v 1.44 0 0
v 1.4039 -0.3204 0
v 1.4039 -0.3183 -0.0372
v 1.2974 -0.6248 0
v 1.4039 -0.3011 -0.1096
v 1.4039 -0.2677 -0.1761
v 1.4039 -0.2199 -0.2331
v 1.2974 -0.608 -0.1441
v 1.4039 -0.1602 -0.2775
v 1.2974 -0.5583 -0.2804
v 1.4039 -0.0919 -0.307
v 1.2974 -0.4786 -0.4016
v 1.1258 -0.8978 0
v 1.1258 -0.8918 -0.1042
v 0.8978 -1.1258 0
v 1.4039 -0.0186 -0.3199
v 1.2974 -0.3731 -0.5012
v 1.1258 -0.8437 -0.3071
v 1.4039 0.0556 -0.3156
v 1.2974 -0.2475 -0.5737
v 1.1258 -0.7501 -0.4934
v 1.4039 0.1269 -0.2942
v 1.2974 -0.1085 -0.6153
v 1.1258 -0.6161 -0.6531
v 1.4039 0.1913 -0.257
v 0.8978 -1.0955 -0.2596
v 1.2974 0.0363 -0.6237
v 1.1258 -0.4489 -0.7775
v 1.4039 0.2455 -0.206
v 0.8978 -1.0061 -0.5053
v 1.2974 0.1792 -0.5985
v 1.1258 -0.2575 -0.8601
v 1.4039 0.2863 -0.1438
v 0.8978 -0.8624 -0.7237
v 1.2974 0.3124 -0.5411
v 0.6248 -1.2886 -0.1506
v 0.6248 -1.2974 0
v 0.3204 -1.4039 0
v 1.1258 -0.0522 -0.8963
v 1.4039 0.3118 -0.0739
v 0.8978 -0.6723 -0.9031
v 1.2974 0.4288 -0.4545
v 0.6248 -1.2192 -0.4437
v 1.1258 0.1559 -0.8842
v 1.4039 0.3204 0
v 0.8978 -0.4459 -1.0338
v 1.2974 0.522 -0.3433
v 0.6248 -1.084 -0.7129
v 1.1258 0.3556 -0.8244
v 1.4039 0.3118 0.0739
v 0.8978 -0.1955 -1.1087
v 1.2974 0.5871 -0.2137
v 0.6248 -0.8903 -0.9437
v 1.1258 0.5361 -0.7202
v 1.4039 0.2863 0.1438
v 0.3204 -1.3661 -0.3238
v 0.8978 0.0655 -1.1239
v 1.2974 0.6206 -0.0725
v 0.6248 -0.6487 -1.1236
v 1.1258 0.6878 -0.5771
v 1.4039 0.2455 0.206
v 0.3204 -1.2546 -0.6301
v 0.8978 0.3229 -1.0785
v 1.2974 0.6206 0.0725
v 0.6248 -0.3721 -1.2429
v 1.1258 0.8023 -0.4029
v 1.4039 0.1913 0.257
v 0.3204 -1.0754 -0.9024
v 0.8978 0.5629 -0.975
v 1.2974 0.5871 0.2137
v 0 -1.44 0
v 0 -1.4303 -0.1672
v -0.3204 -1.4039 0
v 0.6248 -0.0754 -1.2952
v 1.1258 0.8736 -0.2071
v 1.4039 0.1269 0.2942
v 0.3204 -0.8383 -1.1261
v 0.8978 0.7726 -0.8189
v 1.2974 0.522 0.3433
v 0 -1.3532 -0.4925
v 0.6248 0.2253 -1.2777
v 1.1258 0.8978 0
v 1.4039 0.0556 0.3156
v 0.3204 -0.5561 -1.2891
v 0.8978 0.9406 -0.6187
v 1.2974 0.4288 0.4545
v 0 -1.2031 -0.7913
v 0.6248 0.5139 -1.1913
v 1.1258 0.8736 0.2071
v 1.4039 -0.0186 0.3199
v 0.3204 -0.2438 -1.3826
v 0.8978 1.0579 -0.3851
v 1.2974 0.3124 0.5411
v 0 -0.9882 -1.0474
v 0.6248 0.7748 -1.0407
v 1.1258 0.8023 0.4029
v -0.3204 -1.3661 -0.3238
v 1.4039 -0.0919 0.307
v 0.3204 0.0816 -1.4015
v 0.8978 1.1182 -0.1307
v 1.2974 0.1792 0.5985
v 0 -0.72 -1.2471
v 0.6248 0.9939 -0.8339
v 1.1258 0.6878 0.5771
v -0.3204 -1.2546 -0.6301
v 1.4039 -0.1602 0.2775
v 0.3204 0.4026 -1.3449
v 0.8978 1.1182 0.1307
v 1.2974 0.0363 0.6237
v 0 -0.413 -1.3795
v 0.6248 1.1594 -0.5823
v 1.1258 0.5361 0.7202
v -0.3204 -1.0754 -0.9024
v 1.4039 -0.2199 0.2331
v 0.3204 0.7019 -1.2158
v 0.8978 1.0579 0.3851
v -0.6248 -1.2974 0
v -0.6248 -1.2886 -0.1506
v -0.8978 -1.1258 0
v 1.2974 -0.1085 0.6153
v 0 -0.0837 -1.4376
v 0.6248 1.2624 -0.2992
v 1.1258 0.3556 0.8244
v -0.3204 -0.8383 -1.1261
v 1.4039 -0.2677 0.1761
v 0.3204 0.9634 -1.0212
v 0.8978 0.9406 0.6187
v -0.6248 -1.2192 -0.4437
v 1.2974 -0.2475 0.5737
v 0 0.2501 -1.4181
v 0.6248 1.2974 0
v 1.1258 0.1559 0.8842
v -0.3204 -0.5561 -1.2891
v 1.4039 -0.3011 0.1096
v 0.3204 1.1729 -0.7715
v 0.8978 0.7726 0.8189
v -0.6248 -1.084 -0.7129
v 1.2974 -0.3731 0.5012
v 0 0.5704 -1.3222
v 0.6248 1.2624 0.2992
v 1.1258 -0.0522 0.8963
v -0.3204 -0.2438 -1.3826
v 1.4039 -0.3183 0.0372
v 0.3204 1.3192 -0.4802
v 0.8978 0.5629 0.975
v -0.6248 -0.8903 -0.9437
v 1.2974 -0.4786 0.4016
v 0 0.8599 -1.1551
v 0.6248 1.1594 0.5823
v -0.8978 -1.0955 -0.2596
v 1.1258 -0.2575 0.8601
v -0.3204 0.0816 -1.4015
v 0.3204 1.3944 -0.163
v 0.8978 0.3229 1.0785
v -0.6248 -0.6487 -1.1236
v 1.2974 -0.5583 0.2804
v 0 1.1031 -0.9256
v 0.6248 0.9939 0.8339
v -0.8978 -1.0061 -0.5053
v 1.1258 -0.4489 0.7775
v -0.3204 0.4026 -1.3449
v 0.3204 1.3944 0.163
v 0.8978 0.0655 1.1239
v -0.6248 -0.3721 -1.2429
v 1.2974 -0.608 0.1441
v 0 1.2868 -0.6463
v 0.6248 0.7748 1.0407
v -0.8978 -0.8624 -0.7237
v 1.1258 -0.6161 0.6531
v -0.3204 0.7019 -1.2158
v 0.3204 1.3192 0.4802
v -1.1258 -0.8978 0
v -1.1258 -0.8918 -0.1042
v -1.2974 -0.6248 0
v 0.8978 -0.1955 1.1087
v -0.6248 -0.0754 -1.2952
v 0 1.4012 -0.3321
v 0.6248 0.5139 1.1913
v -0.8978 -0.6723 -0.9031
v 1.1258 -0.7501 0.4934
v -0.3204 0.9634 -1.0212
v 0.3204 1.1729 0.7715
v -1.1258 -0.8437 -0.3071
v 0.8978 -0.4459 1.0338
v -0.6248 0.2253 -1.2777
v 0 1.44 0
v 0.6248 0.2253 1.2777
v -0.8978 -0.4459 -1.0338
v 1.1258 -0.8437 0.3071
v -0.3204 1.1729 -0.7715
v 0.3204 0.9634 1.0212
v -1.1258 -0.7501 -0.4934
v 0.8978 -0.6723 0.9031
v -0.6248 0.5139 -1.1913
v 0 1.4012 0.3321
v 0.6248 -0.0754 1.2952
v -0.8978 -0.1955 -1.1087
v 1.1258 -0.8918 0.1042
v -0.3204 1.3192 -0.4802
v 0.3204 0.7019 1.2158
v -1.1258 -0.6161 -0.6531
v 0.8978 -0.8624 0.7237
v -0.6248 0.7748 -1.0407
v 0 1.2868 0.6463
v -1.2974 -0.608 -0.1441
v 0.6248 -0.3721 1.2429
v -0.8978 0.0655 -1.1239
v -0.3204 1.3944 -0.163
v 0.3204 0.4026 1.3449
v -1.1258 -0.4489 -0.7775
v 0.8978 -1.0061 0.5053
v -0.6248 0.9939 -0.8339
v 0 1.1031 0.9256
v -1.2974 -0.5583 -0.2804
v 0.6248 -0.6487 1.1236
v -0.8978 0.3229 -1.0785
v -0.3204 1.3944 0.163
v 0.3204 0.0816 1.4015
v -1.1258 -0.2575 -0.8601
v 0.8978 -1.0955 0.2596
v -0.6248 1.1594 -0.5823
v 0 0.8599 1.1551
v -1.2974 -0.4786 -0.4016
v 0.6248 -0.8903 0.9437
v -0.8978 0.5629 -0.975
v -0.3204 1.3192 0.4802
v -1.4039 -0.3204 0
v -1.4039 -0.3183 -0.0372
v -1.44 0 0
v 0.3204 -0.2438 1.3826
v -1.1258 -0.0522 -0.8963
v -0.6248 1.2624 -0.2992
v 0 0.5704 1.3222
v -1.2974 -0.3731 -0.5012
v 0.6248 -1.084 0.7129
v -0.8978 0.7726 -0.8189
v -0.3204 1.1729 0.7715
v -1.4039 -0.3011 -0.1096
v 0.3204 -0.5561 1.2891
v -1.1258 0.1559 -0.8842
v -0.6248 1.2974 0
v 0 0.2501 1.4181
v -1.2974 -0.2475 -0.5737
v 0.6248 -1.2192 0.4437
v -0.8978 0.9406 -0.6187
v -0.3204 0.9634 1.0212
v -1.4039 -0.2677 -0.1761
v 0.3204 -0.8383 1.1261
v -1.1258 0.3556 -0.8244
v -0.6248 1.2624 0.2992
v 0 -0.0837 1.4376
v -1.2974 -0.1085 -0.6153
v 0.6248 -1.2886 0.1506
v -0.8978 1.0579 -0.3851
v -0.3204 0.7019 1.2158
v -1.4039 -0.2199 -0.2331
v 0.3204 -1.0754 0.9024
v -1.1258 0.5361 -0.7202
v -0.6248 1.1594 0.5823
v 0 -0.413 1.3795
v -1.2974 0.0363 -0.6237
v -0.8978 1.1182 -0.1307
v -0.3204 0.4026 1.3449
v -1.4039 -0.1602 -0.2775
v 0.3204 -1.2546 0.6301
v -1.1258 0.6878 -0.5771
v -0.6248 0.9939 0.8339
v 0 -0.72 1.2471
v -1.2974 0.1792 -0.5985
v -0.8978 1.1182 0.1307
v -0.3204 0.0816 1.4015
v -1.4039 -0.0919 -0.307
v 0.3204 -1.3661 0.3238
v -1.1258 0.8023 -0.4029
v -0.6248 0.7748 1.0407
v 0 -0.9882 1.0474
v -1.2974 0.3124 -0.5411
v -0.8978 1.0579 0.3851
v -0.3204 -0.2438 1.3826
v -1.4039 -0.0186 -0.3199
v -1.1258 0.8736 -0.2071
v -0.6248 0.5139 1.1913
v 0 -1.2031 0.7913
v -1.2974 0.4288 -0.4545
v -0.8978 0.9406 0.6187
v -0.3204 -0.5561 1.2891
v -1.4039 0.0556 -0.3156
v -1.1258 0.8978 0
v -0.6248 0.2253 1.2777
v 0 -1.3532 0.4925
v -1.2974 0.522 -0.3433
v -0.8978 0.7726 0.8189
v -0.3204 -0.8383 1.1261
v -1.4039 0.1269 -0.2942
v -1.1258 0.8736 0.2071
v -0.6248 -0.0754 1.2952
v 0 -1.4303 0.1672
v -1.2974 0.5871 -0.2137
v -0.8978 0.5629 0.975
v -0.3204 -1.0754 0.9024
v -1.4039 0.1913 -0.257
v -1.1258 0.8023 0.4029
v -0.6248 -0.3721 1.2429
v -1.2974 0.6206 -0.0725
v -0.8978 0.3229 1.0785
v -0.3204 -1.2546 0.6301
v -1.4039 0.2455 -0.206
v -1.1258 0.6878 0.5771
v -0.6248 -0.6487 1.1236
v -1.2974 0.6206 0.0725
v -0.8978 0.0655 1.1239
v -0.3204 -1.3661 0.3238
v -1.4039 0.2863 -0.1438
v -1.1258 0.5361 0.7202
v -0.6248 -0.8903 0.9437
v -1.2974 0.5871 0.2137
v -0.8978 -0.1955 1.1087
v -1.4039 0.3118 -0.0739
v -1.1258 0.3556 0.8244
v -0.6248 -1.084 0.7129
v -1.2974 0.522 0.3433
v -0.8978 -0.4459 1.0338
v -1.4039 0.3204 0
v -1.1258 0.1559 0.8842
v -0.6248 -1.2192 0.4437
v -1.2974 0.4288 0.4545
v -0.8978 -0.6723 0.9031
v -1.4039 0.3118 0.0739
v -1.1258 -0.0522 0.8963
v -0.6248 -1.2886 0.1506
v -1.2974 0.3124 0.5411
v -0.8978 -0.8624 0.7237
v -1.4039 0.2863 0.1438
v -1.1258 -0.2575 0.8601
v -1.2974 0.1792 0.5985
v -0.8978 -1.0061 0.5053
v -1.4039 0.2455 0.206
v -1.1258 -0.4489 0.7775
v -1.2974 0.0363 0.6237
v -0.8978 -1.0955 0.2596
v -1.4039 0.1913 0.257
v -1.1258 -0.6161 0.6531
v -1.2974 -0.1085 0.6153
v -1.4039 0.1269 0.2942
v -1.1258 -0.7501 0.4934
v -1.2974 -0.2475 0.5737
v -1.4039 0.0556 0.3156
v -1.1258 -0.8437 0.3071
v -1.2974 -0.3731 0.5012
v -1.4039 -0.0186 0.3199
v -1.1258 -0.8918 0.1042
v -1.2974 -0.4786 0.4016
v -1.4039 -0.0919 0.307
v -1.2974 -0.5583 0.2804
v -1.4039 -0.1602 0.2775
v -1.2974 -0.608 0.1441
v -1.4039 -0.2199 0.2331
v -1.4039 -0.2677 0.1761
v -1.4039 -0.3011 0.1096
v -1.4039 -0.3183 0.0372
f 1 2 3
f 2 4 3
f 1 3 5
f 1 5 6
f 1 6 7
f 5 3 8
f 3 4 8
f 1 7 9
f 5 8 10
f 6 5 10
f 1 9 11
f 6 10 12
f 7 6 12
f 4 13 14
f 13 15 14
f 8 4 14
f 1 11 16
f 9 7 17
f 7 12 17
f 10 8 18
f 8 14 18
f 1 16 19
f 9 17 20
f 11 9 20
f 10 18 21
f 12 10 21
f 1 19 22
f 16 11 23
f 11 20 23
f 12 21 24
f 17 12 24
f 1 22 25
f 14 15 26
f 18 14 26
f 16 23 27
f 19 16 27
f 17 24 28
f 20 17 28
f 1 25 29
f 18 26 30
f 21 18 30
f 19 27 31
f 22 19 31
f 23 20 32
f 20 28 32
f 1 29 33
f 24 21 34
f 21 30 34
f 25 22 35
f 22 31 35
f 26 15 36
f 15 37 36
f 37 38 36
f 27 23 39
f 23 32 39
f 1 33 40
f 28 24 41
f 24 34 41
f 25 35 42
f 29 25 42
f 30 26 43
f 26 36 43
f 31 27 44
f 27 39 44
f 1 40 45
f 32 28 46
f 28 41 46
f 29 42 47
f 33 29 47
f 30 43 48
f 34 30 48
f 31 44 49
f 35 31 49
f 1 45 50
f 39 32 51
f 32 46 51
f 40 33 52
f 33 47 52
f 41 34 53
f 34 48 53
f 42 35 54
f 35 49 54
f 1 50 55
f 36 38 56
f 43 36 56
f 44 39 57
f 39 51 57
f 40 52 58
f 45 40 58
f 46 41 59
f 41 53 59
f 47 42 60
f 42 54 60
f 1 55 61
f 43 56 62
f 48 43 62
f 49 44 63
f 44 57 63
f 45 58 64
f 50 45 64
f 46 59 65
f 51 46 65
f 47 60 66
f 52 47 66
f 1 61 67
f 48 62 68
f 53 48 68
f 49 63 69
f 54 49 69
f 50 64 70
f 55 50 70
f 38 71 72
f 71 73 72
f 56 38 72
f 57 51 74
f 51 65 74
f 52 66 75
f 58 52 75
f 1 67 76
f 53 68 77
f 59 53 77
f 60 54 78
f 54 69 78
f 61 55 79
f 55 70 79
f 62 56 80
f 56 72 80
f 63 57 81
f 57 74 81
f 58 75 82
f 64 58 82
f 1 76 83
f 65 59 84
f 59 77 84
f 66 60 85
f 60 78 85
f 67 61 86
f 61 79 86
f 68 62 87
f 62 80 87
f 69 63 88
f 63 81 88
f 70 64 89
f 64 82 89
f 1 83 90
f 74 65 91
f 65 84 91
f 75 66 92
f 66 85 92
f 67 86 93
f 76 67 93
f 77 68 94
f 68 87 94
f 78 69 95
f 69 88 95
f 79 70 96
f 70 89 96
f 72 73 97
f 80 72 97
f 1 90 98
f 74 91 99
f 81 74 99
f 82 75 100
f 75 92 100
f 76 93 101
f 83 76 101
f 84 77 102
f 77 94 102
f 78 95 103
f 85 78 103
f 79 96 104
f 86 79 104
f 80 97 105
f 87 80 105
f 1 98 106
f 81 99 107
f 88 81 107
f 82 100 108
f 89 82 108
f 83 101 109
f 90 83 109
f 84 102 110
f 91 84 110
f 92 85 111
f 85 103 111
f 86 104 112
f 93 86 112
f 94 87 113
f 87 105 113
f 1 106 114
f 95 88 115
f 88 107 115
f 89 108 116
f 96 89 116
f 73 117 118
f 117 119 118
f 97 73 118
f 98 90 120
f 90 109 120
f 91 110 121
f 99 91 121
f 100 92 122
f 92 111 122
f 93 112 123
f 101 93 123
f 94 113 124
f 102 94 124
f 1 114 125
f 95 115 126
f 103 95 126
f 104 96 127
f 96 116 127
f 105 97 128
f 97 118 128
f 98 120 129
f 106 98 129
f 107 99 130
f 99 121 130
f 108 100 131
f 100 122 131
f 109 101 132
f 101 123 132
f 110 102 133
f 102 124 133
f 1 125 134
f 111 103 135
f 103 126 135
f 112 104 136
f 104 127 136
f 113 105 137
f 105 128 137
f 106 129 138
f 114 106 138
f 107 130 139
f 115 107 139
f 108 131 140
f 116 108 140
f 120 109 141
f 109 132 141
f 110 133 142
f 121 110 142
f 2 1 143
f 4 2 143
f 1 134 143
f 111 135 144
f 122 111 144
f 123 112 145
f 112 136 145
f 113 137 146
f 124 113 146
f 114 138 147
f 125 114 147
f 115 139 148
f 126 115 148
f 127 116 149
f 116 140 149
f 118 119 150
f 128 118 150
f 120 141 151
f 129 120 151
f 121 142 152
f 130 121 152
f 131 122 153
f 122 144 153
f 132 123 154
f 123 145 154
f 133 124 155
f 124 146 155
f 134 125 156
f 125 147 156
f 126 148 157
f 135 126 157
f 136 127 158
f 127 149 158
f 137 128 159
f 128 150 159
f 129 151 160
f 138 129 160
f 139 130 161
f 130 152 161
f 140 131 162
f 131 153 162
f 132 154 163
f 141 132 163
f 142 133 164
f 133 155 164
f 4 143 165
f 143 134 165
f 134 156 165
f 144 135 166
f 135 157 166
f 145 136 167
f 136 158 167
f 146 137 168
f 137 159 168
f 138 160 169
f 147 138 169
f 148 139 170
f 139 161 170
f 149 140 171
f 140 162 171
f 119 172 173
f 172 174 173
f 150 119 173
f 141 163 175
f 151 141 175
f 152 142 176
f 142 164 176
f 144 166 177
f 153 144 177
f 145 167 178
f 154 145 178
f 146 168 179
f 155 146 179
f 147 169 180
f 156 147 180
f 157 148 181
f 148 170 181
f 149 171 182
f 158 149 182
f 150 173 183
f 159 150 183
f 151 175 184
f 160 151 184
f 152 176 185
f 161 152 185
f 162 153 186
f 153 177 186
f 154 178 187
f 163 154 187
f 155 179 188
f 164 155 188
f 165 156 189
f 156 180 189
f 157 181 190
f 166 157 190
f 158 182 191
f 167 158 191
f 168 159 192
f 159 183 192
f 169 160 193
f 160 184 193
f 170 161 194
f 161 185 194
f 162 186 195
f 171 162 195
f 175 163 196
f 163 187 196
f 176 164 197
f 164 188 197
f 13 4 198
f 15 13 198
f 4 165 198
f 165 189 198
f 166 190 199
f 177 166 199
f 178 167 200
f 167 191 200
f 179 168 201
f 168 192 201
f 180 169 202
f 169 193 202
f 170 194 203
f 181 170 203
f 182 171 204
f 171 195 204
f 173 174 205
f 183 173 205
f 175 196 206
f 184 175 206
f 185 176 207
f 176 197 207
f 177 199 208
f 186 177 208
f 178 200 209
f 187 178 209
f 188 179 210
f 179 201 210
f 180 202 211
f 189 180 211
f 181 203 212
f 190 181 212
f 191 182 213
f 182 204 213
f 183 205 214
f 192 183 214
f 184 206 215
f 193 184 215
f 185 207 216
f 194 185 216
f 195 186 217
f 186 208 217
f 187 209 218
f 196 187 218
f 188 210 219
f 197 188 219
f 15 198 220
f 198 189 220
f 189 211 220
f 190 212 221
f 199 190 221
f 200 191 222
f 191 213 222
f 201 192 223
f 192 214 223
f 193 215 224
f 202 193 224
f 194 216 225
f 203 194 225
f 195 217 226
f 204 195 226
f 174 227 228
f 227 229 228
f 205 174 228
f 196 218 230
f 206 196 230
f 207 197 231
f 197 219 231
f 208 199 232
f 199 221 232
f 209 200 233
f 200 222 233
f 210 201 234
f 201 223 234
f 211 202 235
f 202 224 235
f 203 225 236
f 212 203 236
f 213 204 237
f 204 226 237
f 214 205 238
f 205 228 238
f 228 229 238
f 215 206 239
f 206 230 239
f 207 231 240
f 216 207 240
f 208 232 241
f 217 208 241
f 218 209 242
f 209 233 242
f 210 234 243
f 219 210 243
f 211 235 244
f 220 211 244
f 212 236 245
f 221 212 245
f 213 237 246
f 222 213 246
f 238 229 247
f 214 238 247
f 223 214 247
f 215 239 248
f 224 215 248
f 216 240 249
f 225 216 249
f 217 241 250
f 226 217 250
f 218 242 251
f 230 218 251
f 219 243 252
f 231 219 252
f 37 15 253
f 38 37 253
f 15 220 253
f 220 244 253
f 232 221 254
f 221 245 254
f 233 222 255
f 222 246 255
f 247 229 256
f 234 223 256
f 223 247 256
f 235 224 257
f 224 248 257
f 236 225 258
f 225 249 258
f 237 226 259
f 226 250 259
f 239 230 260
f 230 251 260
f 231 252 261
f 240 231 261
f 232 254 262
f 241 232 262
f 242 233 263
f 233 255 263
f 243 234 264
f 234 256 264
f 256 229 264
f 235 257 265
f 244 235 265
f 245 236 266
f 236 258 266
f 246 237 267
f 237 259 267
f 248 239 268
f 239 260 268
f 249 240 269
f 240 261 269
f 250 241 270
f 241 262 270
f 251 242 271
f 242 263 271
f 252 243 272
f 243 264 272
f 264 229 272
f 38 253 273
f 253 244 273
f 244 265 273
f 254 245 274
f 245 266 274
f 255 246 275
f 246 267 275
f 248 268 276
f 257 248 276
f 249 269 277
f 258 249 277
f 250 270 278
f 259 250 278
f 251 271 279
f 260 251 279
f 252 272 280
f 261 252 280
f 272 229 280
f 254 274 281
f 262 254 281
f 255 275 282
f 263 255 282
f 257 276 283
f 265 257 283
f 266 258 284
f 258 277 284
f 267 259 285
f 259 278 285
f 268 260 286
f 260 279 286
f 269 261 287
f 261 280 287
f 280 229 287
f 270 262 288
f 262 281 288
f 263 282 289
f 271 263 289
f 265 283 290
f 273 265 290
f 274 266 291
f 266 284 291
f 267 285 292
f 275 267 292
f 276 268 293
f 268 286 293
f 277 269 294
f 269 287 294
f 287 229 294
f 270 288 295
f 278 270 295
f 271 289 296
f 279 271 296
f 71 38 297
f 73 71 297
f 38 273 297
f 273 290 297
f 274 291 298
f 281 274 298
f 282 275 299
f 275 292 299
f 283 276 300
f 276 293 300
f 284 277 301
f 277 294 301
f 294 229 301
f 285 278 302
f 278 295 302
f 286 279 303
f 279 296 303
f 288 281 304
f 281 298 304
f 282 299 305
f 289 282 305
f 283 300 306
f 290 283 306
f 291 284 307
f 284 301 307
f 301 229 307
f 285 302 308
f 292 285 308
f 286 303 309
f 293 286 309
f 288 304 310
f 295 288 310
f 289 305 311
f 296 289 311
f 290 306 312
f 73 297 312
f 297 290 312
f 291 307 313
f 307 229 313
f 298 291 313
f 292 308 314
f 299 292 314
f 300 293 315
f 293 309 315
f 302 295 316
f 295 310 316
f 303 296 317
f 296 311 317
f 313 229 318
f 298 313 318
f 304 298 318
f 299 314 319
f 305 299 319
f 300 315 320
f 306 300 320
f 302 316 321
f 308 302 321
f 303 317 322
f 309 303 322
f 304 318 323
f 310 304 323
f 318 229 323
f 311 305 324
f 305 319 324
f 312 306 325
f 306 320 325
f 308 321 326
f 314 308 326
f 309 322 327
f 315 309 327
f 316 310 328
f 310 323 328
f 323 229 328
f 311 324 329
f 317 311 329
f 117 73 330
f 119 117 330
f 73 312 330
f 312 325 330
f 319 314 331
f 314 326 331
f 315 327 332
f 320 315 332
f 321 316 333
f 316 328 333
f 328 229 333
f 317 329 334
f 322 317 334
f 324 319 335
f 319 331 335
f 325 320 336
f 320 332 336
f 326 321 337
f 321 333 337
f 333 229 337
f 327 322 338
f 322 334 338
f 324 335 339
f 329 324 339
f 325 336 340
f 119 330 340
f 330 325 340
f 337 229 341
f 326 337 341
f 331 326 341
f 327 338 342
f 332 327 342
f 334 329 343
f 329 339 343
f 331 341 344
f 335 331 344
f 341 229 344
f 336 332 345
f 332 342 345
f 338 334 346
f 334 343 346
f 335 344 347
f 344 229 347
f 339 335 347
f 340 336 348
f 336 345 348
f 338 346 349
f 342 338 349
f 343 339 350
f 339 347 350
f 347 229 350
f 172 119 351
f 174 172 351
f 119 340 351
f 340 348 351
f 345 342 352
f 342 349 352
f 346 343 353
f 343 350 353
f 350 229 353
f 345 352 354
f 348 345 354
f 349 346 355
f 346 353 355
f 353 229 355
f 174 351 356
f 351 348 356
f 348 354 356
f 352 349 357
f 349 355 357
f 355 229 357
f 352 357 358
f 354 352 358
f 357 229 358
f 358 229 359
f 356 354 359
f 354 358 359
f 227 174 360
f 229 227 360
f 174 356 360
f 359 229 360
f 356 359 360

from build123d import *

# Parameters (mm, degrees)
SCALE1_SCALE = 1.2
SCALE2_SCALE = 0.1


with BuildPart() as part:
    # Sketch1 → Revolve1 (revolve)
    with BuildSketch(Plane.XY):
        with BuildLine():
            Line((-12, 0), (12, 0))
            ThreePointArc((12, 0), (0, -12), (-12, 0))
        make_face()
    revolve(axis=Axis((-12, 0, 0), (1, 0, 0)))


with BuildPart() as part_1:
    # Scale1: scaled about (0, 0, 0)
    add(part.part.scale(SCALE1_SCALE))


with BuildPart() as part_2:
    # Scale2: scaled about (0, 0, 0)
    add(part_1.part.scale(SCALE2_SCALE))


solid = part_2.part
